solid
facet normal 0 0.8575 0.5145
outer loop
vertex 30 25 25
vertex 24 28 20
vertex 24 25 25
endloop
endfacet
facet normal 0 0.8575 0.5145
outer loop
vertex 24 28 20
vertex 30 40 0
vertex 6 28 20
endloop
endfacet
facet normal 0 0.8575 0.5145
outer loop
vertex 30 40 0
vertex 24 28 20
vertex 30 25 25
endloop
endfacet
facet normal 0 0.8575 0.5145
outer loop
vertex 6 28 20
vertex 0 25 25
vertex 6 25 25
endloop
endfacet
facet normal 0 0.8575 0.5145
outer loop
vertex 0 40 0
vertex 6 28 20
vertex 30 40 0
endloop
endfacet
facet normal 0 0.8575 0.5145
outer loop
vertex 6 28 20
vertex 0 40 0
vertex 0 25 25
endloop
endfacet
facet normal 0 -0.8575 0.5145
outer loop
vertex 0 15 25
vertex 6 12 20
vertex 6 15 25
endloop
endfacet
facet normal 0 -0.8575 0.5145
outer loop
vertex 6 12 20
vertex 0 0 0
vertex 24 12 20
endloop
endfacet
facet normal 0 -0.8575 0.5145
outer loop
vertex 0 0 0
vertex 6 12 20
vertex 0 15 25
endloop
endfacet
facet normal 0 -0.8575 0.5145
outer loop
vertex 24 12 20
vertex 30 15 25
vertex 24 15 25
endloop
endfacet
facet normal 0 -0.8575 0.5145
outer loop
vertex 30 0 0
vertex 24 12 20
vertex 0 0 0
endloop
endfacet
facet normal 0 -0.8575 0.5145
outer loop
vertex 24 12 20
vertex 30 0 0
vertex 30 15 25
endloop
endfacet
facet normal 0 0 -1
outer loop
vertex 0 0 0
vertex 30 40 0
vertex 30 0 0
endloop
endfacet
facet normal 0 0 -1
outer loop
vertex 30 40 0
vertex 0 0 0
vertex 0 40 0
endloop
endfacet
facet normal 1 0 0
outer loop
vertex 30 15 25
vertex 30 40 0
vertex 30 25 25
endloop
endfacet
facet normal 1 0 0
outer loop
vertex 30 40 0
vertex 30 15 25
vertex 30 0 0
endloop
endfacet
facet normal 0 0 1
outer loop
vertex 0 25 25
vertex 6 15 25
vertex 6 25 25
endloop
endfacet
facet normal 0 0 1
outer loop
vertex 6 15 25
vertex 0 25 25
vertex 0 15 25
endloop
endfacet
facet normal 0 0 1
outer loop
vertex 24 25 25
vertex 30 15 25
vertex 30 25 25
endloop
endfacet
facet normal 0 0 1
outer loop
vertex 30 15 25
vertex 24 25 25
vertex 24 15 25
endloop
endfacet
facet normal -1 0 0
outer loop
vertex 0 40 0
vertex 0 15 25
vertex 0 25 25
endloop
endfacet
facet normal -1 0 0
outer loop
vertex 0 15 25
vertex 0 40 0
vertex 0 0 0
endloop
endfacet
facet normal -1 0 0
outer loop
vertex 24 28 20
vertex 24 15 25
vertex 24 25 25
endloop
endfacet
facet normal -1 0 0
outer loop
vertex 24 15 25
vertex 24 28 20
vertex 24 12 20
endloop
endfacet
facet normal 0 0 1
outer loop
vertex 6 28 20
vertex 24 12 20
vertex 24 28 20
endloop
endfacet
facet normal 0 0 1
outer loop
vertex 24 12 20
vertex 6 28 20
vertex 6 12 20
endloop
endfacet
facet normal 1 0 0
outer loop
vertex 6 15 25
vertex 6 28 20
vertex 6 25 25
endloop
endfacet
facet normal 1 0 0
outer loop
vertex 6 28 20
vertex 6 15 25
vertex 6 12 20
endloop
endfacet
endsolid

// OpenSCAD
//
//
//

$foot_w = 30;
$foot_d = 40;
$top_d  = 10;

$h        = 25;
$saddle_h = 5;
$saddle_w = 18;

difference() {
    rotate( 90, [ 0, 0, 1 ] )
    rotate( 90, [ 1, 0, 0 ] )
    linear_extrude( height = $foot_w ) {
        polygon( [
            [ 0, 0 ],
            [ $foot_d, 0 ],
            [ ( $foot_d + $top_d ) / 2, $h ],
            [ ( $foot_d - $top_d ) / 2, $h ]
        ] );
    };

    translate( [ ($foot_w - $saddle_w )/2, 0, $h - $saddle_h ]) {
        cube( [ $saddle_w, $foot_d, $h ] );
    }
}
